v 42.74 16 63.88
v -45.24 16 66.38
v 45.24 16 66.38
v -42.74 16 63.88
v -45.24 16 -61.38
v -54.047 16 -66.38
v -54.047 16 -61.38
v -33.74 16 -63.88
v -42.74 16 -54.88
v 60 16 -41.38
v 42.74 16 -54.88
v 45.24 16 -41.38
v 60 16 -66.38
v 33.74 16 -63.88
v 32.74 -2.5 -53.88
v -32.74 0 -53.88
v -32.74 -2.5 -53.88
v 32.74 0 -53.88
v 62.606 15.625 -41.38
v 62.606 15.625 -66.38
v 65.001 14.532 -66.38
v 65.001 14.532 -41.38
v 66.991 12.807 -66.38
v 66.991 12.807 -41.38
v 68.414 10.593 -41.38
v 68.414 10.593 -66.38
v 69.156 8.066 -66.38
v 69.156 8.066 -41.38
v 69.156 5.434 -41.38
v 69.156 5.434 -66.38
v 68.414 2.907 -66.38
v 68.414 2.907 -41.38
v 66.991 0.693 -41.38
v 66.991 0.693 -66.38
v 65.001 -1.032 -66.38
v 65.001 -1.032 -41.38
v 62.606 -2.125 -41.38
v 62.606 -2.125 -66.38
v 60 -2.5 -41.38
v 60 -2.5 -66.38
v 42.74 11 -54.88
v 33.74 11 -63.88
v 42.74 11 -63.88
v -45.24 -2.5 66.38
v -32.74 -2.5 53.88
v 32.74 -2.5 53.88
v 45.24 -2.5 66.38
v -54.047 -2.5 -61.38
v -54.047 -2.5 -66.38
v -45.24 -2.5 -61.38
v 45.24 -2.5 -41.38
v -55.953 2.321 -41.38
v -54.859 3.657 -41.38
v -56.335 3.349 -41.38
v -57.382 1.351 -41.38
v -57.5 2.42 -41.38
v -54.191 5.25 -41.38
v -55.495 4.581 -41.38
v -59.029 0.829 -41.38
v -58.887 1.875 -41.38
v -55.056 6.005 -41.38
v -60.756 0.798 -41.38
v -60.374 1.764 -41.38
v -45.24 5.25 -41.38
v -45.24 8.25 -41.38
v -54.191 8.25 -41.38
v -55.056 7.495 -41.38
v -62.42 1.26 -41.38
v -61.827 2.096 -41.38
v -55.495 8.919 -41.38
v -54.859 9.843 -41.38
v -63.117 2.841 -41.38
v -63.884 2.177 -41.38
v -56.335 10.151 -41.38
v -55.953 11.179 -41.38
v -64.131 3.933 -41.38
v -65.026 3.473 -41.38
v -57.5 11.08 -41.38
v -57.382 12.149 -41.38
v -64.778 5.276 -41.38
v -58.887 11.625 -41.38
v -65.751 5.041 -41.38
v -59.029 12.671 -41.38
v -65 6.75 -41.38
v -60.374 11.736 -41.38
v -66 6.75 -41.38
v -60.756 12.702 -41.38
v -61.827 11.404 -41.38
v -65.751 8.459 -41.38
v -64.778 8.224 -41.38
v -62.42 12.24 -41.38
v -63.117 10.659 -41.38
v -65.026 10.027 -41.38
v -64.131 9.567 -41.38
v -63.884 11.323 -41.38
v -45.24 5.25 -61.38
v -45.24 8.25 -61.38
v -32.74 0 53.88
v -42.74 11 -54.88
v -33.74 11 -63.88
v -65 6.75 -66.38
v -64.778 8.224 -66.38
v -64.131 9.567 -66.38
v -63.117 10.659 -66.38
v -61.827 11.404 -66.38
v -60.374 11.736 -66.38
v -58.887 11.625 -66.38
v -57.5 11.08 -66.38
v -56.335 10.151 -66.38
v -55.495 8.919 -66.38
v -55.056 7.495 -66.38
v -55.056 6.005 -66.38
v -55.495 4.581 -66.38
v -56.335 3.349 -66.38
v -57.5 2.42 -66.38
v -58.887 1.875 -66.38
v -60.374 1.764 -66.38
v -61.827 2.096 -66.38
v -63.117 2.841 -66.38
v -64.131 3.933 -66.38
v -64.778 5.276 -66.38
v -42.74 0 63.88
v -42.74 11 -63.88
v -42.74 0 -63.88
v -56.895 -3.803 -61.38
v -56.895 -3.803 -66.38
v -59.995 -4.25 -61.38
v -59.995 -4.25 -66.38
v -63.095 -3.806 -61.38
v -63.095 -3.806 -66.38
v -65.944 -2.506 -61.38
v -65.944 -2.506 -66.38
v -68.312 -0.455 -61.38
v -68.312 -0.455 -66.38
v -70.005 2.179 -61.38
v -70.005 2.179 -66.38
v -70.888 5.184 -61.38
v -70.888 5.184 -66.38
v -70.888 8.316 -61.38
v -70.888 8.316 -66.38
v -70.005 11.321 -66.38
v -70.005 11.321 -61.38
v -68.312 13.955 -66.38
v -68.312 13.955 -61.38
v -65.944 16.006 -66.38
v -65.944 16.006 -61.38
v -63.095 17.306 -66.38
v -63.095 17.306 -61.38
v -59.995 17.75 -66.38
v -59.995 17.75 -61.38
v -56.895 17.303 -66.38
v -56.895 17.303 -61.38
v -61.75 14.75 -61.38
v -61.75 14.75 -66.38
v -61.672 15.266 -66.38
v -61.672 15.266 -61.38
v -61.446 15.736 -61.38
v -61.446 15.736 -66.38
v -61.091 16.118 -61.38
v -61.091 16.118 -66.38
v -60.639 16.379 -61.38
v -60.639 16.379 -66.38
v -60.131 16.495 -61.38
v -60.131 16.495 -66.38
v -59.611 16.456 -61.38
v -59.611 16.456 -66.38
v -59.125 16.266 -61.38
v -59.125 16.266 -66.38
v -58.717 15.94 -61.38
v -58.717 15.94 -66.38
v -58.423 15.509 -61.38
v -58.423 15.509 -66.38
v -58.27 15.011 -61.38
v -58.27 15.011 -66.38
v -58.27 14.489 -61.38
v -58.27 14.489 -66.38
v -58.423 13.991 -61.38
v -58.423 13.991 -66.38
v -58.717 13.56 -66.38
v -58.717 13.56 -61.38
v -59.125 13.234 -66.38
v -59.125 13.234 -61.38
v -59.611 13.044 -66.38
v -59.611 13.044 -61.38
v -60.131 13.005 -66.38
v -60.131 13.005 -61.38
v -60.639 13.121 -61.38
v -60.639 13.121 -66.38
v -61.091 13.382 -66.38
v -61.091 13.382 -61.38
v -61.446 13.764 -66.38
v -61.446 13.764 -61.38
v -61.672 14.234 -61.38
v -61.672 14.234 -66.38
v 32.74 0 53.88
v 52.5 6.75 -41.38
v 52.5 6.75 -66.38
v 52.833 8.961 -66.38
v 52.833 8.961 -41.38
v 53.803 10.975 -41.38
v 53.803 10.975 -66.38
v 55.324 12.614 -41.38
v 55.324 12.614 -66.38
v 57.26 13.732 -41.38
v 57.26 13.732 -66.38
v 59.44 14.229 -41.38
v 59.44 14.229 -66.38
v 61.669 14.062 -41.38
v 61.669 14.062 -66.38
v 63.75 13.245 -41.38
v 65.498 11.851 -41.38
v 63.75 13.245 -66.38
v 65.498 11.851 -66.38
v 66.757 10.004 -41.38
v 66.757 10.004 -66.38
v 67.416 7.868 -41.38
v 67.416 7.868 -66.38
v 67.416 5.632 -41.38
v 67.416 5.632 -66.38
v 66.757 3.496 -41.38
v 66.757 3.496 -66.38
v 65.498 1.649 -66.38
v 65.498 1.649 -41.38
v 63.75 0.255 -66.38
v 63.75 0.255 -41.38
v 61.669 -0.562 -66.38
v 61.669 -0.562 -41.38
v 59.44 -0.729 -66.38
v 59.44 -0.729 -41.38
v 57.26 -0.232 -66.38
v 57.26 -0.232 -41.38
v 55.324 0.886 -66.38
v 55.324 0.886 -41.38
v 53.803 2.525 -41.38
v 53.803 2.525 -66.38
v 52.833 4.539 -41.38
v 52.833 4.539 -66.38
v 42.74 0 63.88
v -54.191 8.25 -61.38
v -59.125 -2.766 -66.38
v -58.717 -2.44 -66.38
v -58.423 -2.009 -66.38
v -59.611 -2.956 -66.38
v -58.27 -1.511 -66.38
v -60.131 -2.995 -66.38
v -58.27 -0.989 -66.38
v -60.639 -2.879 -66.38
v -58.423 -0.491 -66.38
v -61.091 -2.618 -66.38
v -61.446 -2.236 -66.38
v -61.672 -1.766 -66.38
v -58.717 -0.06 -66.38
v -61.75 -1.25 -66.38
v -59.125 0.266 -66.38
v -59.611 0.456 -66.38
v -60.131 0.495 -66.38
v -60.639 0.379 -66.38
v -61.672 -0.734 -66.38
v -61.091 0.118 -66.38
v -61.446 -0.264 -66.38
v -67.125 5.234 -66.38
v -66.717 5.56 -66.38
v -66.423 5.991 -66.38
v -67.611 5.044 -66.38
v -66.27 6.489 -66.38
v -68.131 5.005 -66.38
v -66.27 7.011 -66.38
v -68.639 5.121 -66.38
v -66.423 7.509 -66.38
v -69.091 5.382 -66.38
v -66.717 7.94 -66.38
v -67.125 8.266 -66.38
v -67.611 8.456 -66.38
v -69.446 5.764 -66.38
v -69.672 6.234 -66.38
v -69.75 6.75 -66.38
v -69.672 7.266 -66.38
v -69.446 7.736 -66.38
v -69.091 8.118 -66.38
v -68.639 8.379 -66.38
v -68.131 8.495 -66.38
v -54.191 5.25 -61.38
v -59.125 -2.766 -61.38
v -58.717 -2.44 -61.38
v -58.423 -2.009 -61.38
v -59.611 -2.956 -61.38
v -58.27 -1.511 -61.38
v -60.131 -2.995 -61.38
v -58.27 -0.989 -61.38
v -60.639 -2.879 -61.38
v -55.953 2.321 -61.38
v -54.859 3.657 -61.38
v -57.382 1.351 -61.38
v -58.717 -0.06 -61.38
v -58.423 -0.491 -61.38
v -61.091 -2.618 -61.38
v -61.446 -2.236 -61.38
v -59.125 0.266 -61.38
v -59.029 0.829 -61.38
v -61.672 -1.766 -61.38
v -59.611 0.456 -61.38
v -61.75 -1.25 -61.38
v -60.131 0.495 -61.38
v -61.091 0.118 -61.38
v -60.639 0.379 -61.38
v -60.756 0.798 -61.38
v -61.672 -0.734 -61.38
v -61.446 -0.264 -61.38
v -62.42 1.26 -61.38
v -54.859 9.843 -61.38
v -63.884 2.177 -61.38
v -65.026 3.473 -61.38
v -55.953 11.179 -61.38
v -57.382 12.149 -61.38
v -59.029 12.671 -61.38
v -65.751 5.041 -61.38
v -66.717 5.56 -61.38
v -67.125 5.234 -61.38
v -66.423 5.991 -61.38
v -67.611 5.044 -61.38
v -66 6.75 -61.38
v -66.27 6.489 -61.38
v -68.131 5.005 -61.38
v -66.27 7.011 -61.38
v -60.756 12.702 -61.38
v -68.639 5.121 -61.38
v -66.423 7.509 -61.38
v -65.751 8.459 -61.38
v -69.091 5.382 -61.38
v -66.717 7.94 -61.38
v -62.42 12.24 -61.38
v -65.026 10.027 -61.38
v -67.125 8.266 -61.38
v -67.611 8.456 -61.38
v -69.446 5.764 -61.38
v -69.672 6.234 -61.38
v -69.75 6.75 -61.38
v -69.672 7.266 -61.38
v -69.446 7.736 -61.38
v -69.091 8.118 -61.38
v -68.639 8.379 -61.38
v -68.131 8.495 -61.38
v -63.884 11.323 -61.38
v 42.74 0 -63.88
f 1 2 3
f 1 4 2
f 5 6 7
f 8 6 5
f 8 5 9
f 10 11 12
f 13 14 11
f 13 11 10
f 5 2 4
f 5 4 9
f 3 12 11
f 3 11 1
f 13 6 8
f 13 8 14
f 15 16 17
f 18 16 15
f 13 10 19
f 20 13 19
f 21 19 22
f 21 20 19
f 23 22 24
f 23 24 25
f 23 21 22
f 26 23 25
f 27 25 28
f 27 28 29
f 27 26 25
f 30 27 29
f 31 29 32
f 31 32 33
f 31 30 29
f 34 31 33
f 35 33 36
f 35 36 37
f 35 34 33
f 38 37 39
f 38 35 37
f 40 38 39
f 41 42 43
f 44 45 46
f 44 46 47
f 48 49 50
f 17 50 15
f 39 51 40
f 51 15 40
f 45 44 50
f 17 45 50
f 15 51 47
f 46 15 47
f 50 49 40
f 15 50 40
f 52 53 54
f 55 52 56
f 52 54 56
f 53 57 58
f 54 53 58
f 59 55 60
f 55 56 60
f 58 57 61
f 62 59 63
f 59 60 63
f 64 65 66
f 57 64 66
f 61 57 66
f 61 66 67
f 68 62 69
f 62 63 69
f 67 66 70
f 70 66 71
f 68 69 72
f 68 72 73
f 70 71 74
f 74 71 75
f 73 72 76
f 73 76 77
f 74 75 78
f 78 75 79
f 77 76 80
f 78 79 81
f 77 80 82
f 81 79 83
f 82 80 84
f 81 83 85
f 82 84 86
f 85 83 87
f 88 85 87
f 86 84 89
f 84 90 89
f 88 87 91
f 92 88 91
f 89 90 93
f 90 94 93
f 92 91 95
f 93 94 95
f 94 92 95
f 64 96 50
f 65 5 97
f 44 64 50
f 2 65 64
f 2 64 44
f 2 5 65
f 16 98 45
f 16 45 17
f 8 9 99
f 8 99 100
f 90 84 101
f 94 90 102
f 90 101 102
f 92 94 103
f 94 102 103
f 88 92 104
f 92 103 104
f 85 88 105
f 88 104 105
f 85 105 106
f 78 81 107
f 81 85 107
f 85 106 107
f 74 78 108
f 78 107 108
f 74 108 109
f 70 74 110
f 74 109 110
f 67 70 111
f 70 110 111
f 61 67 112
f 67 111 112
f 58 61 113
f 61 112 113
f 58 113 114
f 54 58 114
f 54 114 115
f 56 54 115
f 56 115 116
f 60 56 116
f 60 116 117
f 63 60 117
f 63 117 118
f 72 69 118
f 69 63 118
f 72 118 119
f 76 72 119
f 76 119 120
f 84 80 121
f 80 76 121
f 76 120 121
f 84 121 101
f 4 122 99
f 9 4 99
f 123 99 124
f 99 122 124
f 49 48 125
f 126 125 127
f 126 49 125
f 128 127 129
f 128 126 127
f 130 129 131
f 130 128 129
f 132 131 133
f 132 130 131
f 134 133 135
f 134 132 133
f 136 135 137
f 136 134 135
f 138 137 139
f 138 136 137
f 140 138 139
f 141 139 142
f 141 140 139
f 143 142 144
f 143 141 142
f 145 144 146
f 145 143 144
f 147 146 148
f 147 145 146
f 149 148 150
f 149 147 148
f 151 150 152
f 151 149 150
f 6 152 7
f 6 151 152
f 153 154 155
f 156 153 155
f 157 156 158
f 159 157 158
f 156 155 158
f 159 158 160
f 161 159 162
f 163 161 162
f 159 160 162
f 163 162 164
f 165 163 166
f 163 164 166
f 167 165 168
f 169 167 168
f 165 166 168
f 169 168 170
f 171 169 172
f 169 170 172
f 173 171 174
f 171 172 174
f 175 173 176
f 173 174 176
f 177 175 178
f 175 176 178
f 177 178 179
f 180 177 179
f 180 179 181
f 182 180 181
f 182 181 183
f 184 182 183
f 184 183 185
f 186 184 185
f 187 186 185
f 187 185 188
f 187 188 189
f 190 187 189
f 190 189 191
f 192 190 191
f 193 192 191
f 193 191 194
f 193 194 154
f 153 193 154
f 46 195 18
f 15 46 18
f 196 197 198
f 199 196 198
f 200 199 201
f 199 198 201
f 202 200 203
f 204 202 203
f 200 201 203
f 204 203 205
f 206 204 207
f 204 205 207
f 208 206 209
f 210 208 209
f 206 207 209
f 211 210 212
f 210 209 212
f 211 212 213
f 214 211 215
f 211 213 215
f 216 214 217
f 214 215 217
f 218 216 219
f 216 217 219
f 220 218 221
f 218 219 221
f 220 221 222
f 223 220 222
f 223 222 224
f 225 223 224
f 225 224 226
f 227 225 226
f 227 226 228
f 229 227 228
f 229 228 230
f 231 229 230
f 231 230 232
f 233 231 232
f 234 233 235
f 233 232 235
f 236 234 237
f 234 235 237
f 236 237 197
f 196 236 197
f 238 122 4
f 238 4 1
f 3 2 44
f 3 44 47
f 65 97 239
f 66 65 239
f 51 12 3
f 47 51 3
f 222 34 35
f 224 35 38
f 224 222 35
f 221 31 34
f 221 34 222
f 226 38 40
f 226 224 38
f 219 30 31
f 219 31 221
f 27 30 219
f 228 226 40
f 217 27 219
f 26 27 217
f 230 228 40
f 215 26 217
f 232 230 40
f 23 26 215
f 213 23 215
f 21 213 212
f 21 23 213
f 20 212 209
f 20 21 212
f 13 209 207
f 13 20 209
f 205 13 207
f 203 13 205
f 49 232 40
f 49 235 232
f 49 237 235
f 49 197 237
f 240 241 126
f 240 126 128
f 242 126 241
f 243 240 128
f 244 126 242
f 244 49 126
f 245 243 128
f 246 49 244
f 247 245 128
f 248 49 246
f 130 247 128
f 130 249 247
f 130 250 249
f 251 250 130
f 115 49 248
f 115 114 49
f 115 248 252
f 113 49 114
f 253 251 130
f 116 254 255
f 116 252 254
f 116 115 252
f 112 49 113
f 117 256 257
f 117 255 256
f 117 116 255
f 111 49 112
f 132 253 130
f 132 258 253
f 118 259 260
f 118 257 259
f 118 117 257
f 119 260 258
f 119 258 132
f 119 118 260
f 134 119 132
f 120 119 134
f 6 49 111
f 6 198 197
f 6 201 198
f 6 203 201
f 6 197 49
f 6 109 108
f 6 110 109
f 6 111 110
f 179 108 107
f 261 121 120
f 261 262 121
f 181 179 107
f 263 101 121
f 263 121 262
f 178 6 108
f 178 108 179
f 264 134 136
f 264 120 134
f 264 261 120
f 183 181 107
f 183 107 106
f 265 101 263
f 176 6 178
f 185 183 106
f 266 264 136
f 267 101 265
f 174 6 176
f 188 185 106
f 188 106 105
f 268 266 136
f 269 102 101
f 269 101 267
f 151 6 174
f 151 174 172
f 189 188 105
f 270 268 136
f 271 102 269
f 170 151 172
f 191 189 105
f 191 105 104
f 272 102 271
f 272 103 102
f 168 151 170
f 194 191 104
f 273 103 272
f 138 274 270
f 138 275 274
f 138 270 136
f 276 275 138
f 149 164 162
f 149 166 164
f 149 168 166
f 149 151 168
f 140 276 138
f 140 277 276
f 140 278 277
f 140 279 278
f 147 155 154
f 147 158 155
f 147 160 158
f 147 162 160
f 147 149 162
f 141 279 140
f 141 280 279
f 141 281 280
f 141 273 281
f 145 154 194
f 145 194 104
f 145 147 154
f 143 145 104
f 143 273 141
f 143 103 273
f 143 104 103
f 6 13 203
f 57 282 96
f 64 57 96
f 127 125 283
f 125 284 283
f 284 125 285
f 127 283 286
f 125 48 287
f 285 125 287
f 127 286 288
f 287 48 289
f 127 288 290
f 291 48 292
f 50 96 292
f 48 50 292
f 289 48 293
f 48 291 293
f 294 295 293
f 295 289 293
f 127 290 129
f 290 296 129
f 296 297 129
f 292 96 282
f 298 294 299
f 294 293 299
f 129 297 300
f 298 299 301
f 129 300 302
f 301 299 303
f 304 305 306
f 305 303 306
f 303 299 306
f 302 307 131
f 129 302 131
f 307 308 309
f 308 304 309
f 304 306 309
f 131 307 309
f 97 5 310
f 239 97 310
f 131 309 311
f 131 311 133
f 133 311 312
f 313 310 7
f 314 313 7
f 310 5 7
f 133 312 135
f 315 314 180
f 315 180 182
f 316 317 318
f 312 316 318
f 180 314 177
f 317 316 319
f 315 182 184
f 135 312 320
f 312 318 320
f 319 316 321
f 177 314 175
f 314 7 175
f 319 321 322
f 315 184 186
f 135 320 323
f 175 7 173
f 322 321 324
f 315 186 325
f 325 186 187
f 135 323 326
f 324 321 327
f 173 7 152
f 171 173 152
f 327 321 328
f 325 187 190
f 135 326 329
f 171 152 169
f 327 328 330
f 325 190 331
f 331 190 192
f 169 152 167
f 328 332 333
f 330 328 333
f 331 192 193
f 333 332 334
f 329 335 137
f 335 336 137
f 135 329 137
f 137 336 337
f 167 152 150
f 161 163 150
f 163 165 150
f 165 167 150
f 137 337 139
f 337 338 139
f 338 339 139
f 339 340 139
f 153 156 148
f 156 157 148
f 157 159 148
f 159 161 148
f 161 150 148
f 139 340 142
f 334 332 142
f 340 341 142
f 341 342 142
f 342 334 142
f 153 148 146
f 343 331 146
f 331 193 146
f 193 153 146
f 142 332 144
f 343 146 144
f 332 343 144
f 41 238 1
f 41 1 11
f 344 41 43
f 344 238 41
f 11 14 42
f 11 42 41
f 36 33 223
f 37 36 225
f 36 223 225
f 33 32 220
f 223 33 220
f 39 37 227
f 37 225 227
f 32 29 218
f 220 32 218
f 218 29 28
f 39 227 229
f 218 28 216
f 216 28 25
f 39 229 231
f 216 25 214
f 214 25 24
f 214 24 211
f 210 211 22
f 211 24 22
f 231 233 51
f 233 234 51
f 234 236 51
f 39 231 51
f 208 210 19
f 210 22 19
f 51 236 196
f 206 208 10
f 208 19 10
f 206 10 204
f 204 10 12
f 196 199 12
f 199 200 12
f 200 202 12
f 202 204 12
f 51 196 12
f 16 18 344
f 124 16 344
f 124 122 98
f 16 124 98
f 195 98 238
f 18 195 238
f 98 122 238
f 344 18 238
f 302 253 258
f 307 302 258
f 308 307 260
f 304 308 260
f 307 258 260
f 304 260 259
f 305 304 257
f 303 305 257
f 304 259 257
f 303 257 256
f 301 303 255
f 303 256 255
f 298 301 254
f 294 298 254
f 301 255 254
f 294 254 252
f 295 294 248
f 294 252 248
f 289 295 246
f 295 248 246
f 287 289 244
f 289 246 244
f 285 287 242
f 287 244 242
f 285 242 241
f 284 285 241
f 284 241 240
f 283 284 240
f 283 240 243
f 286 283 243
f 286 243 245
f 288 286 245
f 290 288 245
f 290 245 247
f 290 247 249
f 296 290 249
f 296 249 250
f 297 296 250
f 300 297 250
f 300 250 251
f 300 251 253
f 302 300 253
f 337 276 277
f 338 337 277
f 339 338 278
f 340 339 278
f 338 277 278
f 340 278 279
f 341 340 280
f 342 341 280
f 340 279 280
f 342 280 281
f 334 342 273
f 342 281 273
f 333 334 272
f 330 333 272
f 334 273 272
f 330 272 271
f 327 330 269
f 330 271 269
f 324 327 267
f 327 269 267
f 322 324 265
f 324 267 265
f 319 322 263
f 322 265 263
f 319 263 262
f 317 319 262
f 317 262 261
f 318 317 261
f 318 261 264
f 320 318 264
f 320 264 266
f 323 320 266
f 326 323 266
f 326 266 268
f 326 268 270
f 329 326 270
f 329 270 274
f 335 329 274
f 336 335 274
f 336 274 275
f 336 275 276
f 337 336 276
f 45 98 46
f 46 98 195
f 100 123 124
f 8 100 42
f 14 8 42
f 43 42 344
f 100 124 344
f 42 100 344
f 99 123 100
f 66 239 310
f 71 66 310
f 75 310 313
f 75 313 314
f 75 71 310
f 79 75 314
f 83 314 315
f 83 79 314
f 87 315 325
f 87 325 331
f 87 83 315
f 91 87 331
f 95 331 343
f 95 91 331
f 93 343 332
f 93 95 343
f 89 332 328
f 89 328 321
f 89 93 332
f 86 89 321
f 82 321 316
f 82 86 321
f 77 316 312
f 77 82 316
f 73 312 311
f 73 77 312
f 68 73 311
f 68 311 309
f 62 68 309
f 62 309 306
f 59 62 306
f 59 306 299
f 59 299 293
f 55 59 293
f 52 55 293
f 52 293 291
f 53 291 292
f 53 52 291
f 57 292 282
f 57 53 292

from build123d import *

# Parameters (mm, degrees)
SKETCH1_W           = 90.48
SKETCH1_H           = 132.76
SKETCH1_W_2         = 85.48
SKETCH1_H_2         = 127.76
BOSS_EXTRUDE1_DEPTH = 16
SKETCH2_W           = 90.48
SKETCH2_H           = 132.76
BOSS_EXTRUDE2_DEPTH = 2.5
SKETCH3_R           = 7.5
BOSS_EXTRUDE3_DEPTH = 25
SKETCH4_R           = 7.5
SKETCH4_R_2         = 5
BOSS_EXTRUDE4_DEPTH = 25
SKETCH5_R           = 11
SKETCH5_R_2         = 5
BOSS_EXTRUDE5_DEPTH = 5
SKETCH7_R           = 5
CUT_EXTRUDE2_DEPTH  = 20
CUT_EXTRUDE3_REACH  = 134.76
SKETCH8_R           = 1.75
BOSS_EXTRUDE6_DEPTH = 5
SKETCH10_W          = 65.48
SKETCH10_H          = 107.76
CUT_EXTRUDE4_DEPTH  = 5.25


with BuildPart() as part:
    # Sketch1 → Boss-Extrude1 (new body)
    with BuildSketch(Plane(origin=(0, 0, 0), x_dir=(1, 0, 0), z_dir=(0, 1, 0))):
        Rectangle(SKETCH1_W, SKETCH1_H)
        Rectangle(SKETCH1_W_2, SKETCH1_H_2, mode=Mode.SUBTRACT)
    extrude(amount=BOSS_EXTRUDE1_DEPTH)

    # Sketch2 → Boss-Extrude2 (add)
    with BuildSketch(Plane.XZ):
        Rectangle(SKETCH2_W, SKETCH2_H)
    extrude(amount=BOSS_EXTRUDE2_DEPTH)

    # Sketch3 → Boss-Extrude3 (add)
    with BuildSketch(Plane(origin=(0, 0, -66.38), x_dir=(-1, 0, 0), z_dir=(0, 0, -1))):
        with BuildLine():
            Line((-45.24, 16), (-60, 16))
            ThreePointArc((-60, 16), (-69.25, 6.75), (-60, -2.5))
            Line((-60, -2.5), (-45.24, -2.5))
            Line((-45.24, -2.5), (-45.24, 16))
        make_face()
        with Locations((-60, 6.75)):
            Circle(SKETCH3_R, mode=Mode.SUBTRACT)
    boss_extrude3 = extrude(amount=-BOSS_EXTRUDE3_DEPTH)

    # Mirror1: Boss-Extrude3 across plane
    add(boss_extrude3.mirror(Plane(origin=(0, 0, 0), x_dir=(0, 0, 1), z_dir=(1, 0, 0))))

    # Sketch4 → Boss-Extrude4 (add)
    with BuildSketch(Plane(origin=(0, 0, -66.38), x_dir=(-1, 0, 0), z_dir=(0, 0, -1))):
        with Locations((60, 6.75)):
            Circle(SKETCH4_R)
        with Locations((60, 6.75)):
            Circle(SKETCH4_R_2, mode=Mode.SUBTRACT)
    extrude(amount=-BOSS_EXTRUDE4_DEPTH)

    # Sketch5 → Boss-Extrude5 (add)
    with BuildSketch(Plane(origin=(0, 0, -66.38), x_dir=(-1, 0, 0), z_dir=(0, 0, -1))):
        with Locations((60, 6.75)):
            Circle(SKETCH5_R)
        with Locations((60, 6.75)):
            Circle(SKETCH5_R_2, mode=Mode.SUBTRACT)
    extrude(amount=-BOSS_EXTRUDE5_DEPTH)

    # Sketch7 → Cut-Extrude2 (cut)
    with BuildSketch(Plane.XY.offset(-41.38)):
        with Locations((-60, 6.75)):
            Circle(SKETCH7_R)
        with BuildLine():
            Line((-45.24, -2.5), (-60, -2.5))
            ThreePointArc((-60, -2.5), (-69.25, 6.75), (-60, 16))
            Line((-60, 16), (-45.24, 16))
            Line((-45.24, 16), (-45.24, 8.25))
            Line((-45.24, 8.25), (-54.190524981, 8.25))
            ThreePointArc((-54.190524981, 8.25), (-66, 6.75), (-54.190524981, 5.25))
            Line((-54.190524981, 5.25), (-45.24, 5.25))
            Line((-45.24, 5.25), (-45.24, -2.5))
        make_face()
    extrude(amount=-CUT_EXTRUDE2_DEPTH, mode=Mode.SUBTRACT)

    # Sketch8 → Cut-Extrude3 (cut, up to next)
    with BuildSketch(Plane(origin=(0, 0, -66.38), x_dir=(-1, 0, 0), z_dir=(0, 0, -1)), mode=Mode.PRIVATE) as cut_extrude3_sk1:
        with Locations((60, 14.75)):
            Circle(SKETCH8_R)
    cut_extrude3_tool1 = extrude(cut_extrude3_sk1.sketch, amount=-CUT_EXTRUDE3_REACH, mode=Mode.PRIVATE) & part.part
    add(cut_extrude3_tool1.solids().sort_by_distance((-60, 14.75, -66.38))[0], mode=Mode.SUBTRACT)
    # Sketch8 → Cut-Extrude3 (cut, up to next)
    with BuildSketch(Plane(origin=(0, 0, -66.38), x_dir=(-1, 0, 0), z_dir=(0, 0, -1)), mode=Mode.PRIVATE) as cut_extrude3_sk2:
        with Locations((68, 6.75)):
            Circle(SKETCH8_R)
    cut_extrude3_tool2 = extrude(cut_extrude3_sk2.sketch, amount=-CUT_EXTRUDE3_REACH, mode=Mode.PRIVATE) & part.part
    add(cut_extrude3_tool2.solids().sort_by_distance((-68, 6.75, -66.38))[0], mode=Mode.SUBTRACT)
    # Sketch8 → Cut-Extrude3 (cut, up to next)
    with BuildSketch(Plane(origin=(0, 0, -66.38), x_dir=(-1, 0, 0), z_dir=(0, 0, -1)), mode=Mode.PRIVATE) as cut_extrude3_sk3:
        with Locations((60, -1.25)):
            Circle(SKETCH8_R)
    cut_extrude3_tool3 = extrude(cut_extrude3_sk3.sketch, amount=-CUT_EXTRUDE3_REACH, mode=Mode.PRIVATE) & part.part
    add(cut_extrude3_tool3.solids().sort_by_distance((-60, -1.25, -66.38))[0], mode=Mode.SUBTRACT)

    # Sketch9 → Boss-Extrude6 (add)
    with BuildSketch(Plane(origin=(0, 16, 0), x_dir=(1, 0, 0), z_dir=(0, 1, 0))):
        Polygon((33.74, 63.88), (42.74, 54.88), (42.74, 63.88), align=None)
        Polygon((-42.74, 54.88), (-33.74, 63.88), (-42.74, 63.88), align=None)
    extrude(amount=-BOSS_EXTRUDE6_DEPTH)

    # Sketch10 → Cut-Extrude4 (cut, through all)
    with BuildSketch(Plane(origin=(0, 0, 0), x_dir=(1, 0, 0), z_dir=(0, 1, 0))):
        Rectangle(SKETCH10_W, SKETCH10_H)
    extrude(amount=-CUT_EXTRUDE4_DEPTH, mode=Mode.SUBTRACT)


solid = part.part
